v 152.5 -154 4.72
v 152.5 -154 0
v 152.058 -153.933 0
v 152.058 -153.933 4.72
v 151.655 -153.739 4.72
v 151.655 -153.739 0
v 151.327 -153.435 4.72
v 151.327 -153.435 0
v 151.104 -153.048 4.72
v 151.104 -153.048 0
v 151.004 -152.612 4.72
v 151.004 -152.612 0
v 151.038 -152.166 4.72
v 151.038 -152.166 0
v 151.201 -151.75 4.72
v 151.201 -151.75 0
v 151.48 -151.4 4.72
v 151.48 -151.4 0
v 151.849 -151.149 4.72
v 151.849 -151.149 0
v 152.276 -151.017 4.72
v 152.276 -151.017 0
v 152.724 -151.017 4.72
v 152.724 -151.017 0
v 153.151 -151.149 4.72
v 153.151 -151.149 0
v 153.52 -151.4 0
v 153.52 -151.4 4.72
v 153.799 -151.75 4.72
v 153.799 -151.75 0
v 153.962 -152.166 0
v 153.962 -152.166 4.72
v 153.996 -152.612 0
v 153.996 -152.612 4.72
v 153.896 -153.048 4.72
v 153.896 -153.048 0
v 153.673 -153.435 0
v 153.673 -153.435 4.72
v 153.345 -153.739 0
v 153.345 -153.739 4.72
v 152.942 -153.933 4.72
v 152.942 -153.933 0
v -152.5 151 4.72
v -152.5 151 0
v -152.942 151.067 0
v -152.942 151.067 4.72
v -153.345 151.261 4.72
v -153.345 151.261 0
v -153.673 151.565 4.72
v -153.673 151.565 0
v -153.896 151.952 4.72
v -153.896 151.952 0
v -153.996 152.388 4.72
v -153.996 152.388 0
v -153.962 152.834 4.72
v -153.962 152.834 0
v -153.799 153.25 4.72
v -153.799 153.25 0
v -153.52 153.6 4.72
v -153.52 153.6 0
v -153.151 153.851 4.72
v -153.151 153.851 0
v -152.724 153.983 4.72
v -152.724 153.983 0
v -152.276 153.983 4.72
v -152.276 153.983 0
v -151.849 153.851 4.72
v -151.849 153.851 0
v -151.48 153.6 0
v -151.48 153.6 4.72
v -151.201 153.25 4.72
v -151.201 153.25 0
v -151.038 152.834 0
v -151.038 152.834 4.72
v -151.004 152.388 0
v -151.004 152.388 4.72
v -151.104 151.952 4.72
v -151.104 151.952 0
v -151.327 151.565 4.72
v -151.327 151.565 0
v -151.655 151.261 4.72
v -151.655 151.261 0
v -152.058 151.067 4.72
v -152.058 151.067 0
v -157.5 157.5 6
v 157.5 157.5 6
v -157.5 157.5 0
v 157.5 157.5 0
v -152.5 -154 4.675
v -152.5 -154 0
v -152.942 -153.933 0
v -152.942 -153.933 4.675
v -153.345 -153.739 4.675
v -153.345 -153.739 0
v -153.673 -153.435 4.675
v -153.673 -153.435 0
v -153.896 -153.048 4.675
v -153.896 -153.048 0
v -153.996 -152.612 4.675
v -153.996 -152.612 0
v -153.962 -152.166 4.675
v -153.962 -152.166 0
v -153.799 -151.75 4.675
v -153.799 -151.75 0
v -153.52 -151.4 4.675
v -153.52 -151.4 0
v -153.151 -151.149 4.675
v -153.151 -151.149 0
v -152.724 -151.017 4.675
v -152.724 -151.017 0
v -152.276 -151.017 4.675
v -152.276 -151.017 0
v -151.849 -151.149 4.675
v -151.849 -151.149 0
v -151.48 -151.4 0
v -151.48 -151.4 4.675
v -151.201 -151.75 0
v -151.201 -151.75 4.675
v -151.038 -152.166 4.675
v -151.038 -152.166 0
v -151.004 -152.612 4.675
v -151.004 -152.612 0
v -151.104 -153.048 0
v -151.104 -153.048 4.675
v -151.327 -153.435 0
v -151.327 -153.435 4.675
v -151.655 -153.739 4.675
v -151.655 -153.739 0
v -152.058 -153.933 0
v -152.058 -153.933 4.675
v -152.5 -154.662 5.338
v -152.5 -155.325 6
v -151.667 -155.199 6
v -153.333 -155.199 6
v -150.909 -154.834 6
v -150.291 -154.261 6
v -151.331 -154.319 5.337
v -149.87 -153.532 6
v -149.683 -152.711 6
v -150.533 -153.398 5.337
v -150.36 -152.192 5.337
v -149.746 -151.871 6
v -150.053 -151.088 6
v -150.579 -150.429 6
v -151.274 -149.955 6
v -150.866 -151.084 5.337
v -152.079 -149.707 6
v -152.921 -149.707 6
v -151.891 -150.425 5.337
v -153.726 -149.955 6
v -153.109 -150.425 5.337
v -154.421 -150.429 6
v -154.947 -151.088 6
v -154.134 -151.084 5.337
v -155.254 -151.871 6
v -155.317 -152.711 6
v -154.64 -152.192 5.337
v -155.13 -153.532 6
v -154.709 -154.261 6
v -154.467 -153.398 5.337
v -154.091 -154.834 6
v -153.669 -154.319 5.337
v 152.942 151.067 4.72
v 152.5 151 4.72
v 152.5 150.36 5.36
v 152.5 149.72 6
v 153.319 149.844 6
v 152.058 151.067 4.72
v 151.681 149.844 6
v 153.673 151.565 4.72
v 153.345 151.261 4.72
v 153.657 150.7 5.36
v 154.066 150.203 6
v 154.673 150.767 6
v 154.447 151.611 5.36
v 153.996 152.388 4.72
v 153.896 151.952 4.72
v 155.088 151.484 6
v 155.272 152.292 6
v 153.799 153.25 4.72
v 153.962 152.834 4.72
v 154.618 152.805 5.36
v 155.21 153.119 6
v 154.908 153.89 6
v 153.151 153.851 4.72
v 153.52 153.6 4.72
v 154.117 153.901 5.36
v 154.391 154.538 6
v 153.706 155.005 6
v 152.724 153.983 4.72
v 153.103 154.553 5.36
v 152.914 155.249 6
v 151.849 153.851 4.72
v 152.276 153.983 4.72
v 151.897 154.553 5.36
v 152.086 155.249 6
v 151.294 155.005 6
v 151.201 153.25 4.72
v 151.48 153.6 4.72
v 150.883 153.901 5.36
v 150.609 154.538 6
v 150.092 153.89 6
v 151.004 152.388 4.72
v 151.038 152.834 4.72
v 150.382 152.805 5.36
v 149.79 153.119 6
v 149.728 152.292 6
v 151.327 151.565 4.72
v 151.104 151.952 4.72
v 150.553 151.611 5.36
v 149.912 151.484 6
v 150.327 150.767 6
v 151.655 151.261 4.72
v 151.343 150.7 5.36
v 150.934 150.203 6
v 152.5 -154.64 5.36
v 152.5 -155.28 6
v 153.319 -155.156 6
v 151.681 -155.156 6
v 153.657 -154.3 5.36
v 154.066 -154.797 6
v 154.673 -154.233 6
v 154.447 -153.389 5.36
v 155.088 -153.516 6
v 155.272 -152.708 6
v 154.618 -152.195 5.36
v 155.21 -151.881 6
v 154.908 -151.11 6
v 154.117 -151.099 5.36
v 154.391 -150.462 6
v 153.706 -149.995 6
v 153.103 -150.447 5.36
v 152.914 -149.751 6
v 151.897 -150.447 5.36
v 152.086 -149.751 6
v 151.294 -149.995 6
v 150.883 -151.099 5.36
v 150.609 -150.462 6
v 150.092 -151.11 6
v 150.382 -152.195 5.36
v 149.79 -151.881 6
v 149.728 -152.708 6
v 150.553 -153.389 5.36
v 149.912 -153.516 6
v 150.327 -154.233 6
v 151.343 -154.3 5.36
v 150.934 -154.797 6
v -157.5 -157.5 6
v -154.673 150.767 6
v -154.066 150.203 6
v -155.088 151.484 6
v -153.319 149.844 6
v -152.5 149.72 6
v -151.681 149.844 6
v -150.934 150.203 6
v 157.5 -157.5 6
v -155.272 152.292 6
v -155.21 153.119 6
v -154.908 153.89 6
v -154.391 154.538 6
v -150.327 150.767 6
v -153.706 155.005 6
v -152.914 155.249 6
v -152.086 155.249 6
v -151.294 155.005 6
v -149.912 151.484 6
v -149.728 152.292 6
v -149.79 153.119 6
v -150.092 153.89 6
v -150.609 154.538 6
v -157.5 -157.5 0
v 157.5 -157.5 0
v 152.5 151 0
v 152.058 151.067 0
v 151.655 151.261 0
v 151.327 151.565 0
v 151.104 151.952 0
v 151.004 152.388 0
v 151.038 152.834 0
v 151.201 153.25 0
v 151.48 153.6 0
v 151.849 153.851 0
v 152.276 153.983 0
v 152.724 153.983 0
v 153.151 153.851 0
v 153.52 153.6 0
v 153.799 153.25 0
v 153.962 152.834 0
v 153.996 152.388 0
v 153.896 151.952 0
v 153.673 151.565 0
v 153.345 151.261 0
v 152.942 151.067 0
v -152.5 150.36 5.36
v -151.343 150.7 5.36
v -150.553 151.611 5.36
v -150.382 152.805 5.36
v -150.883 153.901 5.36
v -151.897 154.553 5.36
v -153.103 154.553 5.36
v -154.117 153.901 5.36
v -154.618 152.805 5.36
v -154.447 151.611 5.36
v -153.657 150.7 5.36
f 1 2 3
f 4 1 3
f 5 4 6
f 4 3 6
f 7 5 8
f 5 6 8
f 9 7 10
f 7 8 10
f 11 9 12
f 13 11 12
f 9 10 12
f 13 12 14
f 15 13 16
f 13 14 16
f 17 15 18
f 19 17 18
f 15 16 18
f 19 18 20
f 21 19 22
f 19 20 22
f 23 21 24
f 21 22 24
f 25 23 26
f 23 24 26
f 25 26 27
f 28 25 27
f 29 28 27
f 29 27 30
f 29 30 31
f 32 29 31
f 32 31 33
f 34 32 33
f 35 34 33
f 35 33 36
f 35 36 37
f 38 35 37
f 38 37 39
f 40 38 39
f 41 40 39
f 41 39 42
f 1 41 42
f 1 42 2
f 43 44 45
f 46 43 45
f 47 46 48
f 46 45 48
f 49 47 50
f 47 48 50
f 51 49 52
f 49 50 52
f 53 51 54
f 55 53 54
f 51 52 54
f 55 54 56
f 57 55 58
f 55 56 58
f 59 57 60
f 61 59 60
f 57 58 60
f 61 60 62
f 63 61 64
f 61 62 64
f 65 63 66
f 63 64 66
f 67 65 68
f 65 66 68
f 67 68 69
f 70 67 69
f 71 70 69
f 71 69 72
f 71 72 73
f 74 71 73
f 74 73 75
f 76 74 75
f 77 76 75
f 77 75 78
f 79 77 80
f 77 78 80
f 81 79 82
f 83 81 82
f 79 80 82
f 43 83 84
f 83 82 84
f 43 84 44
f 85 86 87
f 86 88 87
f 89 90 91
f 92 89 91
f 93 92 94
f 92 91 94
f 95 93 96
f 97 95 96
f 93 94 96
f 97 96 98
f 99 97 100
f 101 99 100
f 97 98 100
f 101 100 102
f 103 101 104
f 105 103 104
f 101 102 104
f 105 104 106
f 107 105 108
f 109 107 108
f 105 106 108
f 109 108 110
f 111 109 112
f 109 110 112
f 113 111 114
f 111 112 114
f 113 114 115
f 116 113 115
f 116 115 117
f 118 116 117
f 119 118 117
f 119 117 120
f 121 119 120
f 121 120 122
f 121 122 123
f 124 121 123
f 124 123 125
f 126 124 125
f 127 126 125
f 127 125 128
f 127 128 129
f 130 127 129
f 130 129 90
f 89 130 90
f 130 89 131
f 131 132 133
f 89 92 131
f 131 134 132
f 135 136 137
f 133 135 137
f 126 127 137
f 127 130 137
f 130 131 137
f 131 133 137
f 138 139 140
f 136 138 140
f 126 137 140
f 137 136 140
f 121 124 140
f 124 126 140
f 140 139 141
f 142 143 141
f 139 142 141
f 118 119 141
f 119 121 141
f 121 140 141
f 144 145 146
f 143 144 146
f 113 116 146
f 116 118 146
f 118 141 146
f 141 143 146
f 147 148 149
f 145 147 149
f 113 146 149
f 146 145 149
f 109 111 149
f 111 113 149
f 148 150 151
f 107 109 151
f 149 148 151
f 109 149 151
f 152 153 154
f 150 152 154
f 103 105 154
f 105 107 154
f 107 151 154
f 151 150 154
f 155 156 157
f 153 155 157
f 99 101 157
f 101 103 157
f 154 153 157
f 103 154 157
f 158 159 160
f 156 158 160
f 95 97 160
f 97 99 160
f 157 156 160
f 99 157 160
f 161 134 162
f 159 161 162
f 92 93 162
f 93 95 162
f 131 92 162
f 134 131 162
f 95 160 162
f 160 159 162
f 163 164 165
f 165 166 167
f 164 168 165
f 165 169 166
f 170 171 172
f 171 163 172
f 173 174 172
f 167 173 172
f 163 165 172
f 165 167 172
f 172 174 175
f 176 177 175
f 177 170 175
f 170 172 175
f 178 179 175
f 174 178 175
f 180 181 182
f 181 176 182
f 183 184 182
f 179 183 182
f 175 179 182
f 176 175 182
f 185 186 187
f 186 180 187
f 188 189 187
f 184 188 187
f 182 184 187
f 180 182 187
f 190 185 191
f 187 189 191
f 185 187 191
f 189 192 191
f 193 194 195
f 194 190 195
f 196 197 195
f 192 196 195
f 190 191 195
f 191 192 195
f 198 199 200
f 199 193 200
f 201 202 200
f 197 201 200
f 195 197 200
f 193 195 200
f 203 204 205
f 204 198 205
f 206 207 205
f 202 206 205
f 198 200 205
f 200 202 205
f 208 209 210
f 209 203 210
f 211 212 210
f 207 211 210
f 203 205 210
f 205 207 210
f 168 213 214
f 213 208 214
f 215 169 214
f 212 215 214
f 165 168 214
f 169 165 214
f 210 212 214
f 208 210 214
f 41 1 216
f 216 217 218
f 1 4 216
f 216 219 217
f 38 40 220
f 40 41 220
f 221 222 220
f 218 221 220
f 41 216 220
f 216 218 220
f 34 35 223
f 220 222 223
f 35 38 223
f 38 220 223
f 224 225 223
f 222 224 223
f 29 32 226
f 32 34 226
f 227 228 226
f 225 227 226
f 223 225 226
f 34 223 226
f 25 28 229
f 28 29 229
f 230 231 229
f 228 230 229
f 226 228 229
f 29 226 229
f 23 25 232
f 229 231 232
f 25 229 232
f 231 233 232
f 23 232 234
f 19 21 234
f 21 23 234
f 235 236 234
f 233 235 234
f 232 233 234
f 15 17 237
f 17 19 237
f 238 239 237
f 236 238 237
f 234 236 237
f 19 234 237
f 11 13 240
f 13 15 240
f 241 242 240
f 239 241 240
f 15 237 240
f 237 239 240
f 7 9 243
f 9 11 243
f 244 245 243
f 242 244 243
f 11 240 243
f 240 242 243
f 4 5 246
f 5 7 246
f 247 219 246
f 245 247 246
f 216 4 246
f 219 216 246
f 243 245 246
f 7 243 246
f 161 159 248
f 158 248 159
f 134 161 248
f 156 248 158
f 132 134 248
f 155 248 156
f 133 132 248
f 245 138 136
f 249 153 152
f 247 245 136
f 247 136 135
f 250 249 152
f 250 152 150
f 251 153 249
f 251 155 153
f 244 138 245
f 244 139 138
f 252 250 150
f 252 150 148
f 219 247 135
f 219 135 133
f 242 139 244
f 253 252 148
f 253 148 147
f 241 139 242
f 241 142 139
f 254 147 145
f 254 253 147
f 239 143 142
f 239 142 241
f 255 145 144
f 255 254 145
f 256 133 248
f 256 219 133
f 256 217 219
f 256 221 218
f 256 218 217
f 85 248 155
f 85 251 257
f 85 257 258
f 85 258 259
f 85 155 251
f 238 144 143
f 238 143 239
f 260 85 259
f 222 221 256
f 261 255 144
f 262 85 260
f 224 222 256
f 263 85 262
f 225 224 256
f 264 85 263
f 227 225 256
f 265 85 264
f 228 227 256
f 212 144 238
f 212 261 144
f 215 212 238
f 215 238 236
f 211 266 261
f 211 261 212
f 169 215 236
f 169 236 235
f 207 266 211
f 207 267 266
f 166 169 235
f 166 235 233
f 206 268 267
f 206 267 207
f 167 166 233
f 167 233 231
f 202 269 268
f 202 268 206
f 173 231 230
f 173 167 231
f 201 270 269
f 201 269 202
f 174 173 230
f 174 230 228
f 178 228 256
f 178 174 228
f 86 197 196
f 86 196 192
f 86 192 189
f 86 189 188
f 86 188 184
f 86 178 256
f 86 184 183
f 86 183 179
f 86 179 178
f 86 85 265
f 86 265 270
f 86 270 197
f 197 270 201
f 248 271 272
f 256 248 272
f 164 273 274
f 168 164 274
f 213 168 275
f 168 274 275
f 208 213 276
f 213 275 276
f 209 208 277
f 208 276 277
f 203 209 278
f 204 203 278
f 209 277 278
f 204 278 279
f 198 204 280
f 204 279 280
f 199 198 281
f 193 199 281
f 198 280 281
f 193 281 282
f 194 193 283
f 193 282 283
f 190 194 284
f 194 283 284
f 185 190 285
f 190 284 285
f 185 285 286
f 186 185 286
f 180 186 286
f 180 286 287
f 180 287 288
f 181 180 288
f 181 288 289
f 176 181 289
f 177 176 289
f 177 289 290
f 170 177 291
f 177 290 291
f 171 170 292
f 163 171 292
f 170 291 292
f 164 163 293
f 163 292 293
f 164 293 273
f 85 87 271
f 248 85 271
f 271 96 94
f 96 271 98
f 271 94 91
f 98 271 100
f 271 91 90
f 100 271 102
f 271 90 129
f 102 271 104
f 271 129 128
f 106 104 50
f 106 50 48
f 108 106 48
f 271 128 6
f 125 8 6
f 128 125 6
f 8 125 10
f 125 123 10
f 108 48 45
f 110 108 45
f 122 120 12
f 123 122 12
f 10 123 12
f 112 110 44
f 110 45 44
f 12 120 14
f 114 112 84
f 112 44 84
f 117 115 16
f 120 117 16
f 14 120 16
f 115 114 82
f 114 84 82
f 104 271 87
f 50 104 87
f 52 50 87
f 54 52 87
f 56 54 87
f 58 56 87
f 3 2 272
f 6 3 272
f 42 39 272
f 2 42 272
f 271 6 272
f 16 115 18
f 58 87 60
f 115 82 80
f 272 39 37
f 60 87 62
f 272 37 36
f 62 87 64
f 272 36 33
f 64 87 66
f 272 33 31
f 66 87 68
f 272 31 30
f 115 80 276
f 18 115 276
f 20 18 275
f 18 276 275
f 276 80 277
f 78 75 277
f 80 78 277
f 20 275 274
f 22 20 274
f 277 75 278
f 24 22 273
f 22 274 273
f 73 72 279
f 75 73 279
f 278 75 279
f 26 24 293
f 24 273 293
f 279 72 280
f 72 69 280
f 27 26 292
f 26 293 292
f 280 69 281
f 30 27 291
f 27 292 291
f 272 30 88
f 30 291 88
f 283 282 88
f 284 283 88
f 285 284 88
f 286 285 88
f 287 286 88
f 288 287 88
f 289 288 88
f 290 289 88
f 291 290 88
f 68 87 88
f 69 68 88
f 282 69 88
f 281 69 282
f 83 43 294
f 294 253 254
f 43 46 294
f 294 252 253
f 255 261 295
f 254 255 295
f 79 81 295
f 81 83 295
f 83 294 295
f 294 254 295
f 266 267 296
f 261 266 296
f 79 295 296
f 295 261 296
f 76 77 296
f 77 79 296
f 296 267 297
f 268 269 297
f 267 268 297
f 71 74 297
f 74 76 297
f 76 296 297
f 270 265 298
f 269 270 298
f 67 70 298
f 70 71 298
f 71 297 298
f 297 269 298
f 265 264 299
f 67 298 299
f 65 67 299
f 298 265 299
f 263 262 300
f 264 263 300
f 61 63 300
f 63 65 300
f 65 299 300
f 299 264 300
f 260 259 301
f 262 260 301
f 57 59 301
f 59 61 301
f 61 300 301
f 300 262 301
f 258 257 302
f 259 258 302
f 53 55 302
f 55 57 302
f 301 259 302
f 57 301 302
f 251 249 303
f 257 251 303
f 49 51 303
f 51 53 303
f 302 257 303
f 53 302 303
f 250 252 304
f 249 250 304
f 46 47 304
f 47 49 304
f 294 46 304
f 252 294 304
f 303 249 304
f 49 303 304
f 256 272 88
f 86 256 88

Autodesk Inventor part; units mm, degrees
ref_plane "YZ Plane" through (0, 0, 0) normal (1, 0, 0) x (0, 1, 0)
ref_plane "XZ Plane" through (0, 0, 0) normal (0, 1, 0) x (-1, 0, 0)
ref_plane "XY Plane" through (0, 0, 0) normal (0, 0, 1) x (1, 0, 0)
sketch "Skizze1" plane through (0, 0, 0) normal (0, 0, 1) x (1, 0, 0)
  line L0 (-157.5, -157.5) -> (157.5, -157.5)
  line L1 (157.5, -157.5) -> (157.5, 157.5)
  line L2 (157.5, 157.5) -> (-157.5, 157.5)
  line L3 (-157.5, 157.5) -> (-157.5, -157.5)
  line L4 (-157.5, -157.5) -> (157.5, 157.5) construction
  line L5 (157.5, -157.5) -> (-157.5, 157.5) construction
  point P0 (0, 0)
  dimension "d0" = 315
  dimension "d1" = 315
extrude "Extrusion1" add sketch "Skizze1" along normal blind 6
hole "Bohrung1" at (-152.5, -152.5, 6) direction (0, 0, -1) diameter 3 end through all countersink diameter 5.65 countersink angle 90
hole "Bohrung2" at (152.5, -152.5, 6) direction (0, 0, -1) diameter 3 end through all countersink diameter 5.56 countersink angle 90
hole "Bohrung3" at (152.5, 152.5, 6) direction (0, 0, -1) diameter 3 end through all countersink diameter 5.56 countersink angle 90
hole "Bohrung4" at (-152.5, 152.5, 6) direction (0, 0, -1) diameter 3 end through all countersink diameter 5.56 countersink angle 90
properties part number "alu plate" material "Aluminium 6061"
